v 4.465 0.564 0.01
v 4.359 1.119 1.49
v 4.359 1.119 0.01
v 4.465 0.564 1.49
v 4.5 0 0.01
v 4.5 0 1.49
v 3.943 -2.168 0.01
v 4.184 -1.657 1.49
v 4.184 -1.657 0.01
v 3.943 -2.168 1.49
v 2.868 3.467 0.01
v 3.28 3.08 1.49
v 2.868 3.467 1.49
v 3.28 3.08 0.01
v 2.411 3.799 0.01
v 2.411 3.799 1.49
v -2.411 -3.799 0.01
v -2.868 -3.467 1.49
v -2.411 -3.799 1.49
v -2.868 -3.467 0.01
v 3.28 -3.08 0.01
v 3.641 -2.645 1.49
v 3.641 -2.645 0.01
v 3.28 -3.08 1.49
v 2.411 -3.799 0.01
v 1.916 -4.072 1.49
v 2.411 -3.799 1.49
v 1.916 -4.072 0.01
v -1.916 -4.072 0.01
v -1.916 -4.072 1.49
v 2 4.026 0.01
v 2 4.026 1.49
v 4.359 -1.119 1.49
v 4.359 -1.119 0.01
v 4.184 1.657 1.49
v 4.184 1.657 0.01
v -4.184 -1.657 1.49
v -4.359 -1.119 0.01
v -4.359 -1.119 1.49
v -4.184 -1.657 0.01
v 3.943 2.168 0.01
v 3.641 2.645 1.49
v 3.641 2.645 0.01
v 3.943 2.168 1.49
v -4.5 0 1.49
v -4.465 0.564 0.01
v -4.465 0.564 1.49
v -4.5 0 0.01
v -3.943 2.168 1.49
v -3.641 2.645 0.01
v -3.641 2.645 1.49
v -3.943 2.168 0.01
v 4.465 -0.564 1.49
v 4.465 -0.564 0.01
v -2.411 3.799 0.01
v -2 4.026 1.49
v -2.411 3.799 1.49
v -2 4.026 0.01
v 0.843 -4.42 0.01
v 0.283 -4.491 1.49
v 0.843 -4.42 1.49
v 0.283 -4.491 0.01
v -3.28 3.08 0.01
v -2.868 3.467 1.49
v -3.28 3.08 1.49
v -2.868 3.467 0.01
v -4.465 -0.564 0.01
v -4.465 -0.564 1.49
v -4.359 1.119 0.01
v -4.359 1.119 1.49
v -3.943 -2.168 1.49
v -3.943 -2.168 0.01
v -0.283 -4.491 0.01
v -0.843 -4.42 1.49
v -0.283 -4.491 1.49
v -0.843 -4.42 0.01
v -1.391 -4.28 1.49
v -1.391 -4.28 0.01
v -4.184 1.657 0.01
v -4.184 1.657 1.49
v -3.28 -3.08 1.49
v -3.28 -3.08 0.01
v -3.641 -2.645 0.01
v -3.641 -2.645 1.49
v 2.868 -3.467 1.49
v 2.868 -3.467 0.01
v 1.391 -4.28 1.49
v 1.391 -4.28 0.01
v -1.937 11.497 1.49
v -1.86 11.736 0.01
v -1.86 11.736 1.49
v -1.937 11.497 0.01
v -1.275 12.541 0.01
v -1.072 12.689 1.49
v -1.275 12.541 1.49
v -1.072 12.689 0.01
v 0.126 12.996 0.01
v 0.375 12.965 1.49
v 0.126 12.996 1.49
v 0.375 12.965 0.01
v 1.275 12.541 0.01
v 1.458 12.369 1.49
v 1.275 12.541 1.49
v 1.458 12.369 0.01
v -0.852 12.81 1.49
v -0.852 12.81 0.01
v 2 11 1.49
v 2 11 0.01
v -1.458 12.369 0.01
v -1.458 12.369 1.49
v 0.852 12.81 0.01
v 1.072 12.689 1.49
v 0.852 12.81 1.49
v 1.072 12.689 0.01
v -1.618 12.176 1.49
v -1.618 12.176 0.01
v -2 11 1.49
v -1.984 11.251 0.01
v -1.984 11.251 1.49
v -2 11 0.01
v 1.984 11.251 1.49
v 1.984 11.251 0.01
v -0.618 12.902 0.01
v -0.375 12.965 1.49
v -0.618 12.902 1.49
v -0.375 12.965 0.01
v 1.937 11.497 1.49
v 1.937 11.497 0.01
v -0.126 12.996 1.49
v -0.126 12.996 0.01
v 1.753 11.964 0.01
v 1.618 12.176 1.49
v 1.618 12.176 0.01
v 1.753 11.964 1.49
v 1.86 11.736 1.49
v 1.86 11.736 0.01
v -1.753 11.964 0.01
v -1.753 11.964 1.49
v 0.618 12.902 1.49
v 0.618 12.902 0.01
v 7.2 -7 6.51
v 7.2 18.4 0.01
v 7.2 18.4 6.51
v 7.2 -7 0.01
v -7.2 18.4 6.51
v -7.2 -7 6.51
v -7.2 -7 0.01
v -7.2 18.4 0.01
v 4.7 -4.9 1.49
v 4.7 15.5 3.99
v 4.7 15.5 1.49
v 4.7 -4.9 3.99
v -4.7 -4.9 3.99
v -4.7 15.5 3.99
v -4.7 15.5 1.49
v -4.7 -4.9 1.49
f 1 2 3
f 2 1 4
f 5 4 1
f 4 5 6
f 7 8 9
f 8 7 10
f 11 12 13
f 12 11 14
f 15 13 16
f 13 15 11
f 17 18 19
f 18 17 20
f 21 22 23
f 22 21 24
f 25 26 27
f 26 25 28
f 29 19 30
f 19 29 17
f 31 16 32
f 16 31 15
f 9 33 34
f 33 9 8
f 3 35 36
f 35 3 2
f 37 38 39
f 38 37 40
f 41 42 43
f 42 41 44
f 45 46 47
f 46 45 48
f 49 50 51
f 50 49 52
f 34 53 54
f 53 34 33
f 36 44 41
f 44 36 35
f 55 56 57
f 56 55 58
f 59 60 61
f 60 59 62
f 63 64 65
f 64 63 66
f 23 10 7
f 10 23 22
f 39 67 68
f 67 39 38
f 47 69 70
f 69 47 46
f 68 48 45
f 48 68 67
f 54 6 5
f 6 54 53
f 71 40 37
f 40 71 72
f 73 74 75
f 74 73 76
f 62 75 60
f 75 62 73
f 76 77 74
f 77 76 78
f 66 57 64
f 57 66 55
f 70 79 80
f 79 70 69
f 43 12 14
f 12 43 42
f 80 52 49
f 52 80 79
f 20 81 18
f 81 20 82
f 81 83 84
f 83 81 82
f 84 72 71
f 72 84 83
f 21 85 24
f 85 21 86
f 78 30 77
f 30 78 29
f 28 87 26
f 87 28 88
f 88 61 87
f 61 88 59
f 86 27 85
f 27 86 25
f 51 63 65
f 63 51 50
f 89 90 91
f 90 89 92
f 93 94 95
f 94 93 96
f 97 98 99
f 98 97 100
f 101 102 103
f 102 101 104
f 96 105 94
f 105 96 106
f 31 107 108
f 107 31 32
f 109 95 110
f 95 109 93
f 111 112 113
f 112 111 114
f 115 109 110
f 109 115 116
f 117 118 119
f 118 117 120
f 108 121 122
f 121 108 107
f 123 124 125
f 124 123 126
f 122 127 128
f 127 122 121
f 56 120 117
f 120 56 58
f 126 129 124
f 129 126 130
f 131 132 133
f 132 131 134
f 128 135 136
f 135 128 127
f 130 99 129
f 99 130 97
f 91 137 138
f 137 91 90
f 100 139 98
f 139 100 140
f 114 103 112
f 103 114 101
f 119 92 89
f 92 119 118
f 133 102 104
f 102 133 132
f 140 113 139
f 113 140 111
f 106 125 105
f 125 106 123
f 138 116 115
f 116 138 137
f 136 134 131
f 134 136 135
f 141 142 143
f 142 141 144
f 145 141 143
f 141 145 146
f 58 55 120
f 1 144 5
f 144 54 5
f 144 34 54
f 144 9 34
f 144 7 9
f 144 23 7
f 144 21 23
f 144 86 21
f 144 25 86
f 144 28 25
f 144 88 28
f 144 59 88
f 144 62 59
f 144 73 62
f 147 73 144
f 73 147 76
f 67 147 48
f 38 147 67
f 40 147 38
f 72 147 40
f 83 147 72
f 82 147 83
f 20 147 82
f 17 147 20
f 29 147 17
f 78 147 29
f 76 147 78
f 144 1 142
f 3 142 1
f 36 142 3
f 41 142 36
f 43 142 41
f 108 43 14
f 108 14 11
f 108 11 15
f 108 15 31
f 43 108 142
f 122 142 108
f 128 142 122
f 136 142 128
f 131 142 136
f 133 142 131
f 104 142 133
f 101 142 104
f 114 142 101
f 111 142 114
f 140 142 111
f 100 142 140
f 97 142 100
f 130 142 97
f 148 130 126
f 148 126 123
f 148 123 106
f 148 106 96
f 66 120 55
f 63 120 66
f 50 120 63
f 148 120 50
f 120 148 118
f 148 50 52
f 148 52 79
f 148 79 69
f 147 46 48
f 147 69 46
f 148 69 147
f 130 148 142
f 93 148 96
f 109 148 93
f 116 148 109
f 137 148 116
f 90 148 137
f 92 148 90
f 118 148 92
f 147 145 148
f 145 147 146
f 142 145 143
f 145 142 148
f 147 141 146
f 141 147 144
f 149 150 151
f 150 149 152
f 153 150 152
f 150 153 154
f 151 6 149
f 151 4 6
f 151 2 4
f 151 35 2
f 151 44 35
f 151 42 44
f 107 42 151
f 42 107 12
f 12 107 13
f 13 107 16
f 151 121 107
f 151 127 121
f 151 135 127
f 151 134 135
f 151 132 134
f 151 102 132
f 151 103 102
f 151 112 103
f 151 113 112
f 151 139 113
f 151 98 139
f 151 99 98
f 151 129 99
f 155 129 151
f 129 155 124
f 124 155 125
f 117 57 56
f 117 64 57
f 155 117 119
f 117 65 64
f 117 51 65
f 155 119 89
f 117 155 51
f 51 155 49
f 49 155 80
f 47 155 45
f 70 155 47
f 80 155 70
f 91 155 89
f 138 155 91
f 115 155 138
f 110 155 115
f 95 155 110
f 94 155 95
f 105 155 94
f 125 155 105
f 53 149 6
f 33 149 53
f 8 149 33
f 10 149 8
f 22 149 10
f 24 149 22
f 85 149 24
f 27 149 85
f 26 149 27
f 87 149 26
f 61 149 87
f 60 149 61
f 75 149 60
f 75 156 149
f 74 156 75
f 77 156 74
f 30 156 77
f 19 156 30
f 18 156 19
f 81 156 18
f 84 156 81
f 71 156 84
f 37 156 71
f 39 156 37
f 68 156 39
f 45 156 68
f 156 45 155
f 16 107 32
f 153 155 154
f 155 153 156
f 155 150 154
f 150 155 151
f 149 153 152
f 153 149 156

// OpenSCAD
/*
 *
 * @author  Igor Demyanov
 * @license CC-BY-NC-4.0
 * @version 1.0
 */

function keyhole_size(big_r, small_r)=big_r * 2 + small_r;

module create_keyhole_hanger(big_r = 4.5, small_r = 2, h=1){
    cylinder(h=h, r=big_r, $fn=50);

    hull() { 
        cylinder(h=h, r=small_r, $fn=50);
        translate([0,keyhole_size(big_r, small_r),0]) cylinder(h=h, r=small_r, $fn=50);
    }
}

module create_keyhole_hanger_hangar(big_r = 4.5, small_r = 2, hole_h = 1.5, wall_thickness = 2.5, top_thickness = 2.5, free_h = 2.5){
    gap = 0.4;
    cube_free_w = big_r * 2 + gap;
    cube_free_h = 2 * big_r + keyhole_size(big_r, small_r) + gap;
    cube_w = cube_free_w + wall_thickness * 2;
    cube_h = cube_free_h + wall_thickness * 2;
            
    difference(){
        translate([0,0,+0.01])union(){
            translate([-cube_w/2,-big_r - wall_thickness ,0]) cube(size = [cube_w,cube_h, hole_h + top_thickness + free_h]);
        }
     color("red")create_keyhole_hanger(big_r = big_r, small_r = small_r, h= hole_h);
     color("green") translate([-cube_free_w/2,-big_r - gap , hole_h - 0.01]) cube(size = [cube_free_w,cube_free_h, free_h]);
    }
    
}

create_keyhole_hanger_hangar();
